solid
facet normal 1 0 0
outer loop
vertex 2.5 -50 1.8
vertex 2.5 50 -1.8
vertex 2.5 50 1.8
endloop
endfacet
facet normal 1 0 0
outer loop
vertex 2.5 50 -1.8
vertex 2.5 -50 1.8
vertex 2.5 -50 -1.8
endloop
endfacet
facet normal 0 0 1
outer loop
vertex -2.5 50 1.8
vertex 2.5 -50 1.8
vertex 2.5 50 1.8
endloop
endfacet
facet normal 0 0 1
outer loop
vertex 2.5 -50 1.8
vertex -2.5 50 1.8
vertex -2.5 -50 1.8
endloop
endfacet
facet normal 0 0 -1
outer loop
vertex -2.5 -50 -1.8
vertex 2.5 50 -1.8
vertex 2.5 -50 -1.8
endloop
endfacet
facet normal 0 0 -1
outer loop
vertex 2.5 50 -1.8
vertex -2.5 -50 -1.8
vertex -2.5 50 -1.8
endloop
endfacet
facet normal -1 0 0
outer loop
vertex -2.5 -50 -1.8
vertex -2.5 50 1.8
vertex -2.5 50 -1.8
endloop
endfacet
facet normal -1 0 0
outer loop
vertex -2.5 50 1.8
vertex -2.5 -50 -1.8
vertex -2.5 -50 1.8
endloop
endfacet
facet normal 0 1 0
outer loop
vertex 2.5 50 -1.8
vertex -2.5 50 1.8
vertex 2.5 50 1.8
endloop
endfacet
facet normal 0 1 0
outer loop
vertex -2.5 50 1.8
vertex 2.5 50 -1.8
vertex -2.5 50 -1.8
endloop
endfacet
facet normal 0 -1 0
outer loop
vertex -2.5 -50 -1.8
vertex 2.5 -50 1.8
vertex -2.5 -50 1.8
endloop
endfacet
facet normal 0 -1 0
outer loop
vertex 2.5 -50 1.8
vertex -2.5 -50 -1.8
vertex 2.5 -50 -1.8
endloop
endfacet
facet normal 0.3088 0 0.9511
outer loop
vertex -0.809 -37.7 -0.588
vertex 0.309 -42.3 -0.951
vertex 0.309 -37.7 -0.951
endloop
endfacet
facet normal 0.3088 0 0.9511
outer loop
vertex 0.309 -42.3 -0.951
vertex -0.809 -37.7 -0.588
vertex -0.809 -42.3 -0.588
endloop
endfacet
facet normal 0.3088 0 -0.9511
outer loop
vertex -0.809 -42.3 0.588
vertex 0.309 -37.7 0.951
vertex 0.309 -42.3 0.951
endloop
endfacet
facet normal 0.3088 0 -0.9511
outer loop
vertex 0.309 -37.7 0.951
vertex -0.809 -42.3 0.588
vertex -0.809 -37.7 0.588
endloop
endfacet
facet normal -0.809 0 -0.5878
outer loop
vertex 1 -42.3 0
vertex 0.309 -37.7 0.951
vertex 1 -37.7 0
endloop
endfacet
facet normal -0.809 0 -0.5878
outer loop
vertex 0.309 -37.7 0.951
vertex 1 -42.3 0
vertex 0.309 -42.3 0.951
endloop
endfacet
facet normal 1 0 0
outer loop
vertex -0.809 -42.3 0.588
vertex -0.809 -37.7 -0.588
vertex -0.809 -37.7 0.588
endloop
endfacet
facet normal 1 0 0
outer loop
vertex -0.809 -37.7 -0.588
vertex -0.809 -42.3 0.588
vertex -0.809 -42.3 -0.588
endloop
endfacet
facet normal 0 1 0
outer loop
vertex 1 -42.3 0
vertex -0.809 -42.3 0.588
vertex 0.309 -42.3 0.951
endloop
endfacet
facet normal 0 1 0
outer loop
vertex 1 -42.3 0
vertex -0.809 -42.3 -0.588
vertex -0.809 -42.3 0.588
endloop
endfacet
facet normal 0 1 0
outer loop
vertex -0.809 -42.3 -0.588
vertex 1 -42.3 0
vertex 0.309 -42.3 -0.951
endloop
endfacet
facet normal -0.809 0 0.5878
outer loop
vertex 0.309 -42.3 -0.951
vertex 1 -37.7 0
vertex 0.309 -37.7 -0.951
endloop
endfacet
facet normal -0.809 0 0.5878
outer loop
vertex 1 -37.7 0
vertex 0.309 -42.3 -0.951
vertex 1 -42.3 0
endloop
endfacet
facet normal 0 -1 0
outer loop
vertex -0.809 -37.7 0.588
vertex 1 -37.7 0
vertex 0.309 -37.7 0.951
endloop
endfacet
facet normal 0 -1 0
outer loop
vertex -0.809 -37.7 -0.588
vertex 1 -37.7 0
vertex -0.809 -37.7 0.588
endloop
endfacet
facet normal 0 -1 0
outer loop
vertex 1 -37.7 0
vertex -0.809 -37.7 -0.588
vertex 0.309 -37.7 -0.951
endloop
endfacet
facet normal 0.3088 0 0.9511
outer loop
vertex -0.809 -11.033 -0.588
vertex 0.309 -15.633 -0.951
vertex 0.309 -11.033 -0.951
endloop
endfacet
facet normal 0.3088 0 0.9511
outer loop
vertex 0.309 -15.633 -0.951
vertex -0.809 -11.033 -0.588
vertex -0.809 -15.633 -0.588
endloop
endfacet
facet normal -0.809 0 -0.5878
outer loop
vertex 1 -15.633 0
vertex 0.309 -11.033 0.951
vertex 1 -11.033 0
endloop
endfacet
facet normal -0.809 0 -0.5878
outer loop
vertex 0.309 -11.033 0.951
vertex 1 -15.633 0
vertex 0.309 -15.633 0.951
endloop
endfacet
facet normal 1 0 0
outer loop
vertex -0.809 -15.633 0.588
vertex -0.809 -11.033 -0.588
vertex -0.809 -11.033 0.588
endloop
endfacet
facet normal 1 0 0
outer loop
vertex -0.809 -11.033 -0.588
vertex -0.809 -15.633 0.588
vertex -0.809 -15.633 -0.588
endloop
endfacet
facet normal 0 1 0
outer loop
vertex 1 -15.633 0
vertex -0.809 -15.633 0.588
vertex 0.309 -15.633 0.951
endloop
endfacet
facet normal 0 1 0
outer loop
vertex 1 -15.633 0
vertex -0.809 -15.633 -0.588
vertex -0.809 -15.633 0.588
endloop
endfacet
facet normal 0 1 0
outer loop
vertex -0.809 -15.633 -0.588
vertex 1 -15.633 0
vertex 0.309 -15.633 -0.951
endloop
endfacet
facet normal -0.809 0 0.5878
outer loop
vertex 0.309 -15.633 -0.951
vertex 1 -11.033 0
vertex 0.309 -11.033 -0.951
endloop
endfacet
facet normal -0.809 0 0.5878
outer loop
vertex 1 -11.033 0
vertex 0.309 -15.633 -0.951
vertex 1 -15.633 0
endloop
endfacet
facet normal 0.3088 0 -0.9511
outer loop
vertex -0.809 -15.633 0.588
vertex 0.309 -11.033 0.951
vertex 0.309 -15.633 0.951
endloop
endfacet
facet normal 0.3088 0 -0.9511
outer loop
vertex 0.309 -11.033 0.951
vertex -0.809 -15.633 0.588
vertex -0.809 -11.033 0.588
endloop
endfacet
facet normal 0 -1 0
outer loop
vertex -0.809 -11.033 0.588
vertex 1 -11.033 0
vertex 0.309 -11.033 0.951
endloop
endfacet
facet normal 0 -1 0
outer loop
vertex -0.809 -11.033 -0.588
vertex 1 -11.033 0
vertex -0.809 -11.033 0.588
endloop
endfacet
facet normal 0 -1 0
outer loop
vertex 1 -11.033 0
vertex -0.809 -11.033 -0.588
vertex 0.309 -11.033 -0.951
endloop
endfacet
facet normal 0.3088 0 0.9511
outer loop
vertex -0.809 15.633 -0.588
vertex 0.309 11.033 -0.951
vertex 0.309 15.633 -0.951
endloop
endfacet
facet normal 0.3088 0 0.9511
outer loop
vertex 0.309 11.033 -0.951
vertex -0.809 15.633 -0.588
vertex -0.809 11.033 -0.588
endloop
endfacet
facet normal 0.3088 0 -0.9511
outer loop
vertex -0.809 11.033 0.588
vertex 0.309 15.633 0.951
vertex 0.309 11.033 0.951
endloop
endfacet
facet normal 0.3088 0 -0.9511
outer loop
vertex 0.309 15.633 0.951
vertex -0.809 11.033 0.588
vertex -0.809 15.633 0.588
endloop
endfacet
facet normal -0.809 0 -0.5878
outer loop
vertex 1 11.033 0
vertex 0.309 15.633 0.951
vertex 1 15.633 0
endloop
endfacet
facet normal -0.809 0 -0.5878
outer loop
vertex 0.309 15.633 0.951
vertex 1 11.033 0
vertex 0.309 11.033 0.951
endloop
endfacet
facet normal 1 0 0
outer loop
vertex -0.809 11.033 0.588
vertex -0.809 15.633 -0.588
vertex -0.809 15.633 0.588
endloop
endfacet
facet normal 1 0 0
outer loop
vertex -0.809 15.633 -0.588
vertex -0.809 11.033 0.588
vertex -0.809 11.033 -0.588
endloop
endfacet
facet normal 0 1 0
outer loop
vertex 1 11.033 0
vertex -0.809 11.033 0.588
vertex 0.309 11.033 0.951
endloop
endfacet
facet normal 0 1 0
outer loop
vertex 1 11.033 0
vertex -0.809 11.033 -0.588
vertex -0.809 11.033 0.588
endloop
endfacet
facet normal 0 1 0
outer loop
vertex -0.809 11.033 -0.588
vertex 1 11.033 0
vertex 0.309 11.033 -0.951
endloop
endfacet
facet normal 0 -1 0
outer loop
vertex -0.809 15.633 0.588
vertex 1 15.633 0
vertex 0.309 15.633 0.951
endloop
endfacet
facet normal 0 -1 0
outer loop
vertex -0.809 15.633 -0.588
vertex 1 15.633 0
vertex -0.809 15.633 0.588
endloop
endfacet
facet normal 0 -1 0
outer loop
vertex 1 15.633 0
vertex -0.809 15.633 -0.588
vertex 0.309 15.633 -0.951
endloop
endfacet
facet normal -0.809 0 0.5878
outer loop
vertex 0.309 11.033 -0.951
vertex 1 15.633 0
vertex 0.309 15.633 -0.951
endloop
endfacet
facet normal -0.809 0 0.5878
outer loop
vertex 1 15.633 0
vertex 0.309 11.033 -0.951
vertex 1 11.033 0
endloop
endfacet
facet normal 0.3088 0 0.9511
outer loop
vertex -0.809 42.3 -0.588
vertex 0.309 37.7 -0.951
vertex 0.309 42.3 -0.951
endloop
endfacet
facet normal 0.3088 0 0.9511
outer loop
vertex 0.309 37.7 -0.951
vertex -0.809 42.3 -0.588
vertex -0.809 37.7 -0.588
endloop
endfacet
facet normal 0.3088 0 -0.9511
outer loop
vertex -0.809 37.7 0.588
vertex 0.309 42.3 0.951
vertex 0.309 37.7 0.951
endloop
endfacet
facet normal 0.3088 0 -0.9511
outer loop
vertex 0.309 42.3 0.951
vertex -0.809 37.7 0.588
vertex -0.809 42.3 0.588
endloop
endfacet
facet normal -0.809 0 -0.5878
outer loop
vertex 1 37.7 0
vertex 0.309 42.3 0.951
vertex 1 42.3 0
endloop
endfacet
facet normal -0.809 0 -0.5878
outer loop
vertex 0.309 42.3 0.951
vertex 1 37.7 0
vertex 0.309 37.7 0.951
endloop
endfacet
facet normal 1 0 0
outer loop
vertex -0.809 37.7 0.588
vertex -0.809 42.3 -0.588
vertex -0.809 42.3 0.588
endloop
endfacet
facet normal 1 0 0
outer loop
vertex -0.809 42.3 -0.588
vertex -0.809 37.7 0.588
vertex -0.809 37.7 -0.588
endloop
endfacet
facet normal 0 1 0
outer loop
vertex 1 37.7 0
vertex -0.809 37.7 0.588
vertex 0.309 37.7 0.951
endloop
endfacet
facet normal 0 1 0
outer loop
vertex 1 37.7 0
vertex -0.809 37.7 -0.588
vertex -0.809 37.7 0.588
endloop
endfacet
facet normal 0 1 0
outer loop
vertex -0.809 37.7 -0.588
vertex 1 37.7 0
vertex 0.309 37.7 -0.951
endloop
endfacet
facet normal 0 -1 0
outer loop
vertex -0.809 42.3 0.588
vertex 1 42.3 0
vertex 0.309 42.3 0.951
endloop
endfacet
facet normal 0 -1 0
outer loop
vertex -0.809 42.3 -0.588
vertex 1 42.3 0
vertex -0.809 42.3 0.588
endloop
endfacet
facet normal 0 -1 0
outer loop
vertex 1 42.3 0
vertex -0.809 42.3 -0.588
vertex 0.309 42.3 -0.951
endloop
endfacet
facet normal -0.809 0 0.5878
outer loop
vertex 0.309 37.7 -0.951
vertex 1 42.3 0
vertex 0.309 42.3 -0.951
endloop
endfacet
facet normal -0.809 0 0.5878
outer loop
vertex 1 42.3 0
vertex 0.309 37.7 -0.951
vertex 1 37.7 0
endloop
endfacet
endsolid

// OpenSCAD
// Parameters
rail_length = 100.0; //[50.0:200.0:1]
rail_width = 5.0; //[2.5:10.0:0.1]
rail_height = 3.6; //[1.8:7.2:0.1]
chamfer_length = 1.0; //[0.5:2.0:0.1]
fillet_radius = 0.4; //[0.2:0.8:0.05]
hole_diameter = 2.0; //[1.0:3.0:0.1]
hole_count = 4; //[2:8:1]
hole_edge_margin = 10.0; //[5.0:20.0:1]
hole_overlap = 0.5; //[0.2:2.0:0.1]

// Main rail body
module guide_rail_body() {
  color("Silver")
  cube([rail_width, rail_length, rail_height], center=true);
}

// Chamfer cuts
module end_chamfer_cut_pos() {
  translate([0, rail_length/2 - chamfer_length/2 + 1, 0])
  rotate([0, 45, 0])
  cube([rail_width*2, chamfer_length, rail_height*2], center=true);
}

module end_chamfer_cut_neg() {
  translate([0, -rail_length/2 + chamfer_length/2 - 1, 0])
  rotate([0, 45, 0])
  cube([rail_width*2, chamfer_length, rail_height*2], center=true);
}

// Mounting holes
module mounting_hole(pos_y) {
  translate([0, pos_y, 0])
  rotate([90, 0, 0])
  cylinder(h=rail_height + hole_overlap*2, r=hole_diameter/2, center=true);
}

module mounting_holes() {
  union() {
    mounting_hole(-rail_length/2 + hole_edge_margin);
    mounting_hole(-rail_length/2 + hole_edge_margin + (rail_length - 2*hole_edge_margin)/3);
    mounting_hole(-rail_length/2 + hole_edge_margin + 2*(rail_length - 2*hole_edge_margin)/3);
    mounting_hole(rail_length/2 - hole_edge_margin);
  }
}

// Edge fillets (approximated)
module edge_fillets_sphere() {
  sphere(r=fillet_radius, center=true);
}

// Final rail with chamfers and holes
module rail_with_holes() {
  difference() {
    difference() {
      guide_rail_body();
      end_chamfer_cut_pos();
      end_chamfer_cut_neg();
    }
    mounting_holes();
  }
}

// Final output with edge fillets
module engraved_markings() {
  // Minkowski is avoided due to performance issues, so we skip this step
  rail_with_holes();
}

// Render the final output
engraved_markings();
